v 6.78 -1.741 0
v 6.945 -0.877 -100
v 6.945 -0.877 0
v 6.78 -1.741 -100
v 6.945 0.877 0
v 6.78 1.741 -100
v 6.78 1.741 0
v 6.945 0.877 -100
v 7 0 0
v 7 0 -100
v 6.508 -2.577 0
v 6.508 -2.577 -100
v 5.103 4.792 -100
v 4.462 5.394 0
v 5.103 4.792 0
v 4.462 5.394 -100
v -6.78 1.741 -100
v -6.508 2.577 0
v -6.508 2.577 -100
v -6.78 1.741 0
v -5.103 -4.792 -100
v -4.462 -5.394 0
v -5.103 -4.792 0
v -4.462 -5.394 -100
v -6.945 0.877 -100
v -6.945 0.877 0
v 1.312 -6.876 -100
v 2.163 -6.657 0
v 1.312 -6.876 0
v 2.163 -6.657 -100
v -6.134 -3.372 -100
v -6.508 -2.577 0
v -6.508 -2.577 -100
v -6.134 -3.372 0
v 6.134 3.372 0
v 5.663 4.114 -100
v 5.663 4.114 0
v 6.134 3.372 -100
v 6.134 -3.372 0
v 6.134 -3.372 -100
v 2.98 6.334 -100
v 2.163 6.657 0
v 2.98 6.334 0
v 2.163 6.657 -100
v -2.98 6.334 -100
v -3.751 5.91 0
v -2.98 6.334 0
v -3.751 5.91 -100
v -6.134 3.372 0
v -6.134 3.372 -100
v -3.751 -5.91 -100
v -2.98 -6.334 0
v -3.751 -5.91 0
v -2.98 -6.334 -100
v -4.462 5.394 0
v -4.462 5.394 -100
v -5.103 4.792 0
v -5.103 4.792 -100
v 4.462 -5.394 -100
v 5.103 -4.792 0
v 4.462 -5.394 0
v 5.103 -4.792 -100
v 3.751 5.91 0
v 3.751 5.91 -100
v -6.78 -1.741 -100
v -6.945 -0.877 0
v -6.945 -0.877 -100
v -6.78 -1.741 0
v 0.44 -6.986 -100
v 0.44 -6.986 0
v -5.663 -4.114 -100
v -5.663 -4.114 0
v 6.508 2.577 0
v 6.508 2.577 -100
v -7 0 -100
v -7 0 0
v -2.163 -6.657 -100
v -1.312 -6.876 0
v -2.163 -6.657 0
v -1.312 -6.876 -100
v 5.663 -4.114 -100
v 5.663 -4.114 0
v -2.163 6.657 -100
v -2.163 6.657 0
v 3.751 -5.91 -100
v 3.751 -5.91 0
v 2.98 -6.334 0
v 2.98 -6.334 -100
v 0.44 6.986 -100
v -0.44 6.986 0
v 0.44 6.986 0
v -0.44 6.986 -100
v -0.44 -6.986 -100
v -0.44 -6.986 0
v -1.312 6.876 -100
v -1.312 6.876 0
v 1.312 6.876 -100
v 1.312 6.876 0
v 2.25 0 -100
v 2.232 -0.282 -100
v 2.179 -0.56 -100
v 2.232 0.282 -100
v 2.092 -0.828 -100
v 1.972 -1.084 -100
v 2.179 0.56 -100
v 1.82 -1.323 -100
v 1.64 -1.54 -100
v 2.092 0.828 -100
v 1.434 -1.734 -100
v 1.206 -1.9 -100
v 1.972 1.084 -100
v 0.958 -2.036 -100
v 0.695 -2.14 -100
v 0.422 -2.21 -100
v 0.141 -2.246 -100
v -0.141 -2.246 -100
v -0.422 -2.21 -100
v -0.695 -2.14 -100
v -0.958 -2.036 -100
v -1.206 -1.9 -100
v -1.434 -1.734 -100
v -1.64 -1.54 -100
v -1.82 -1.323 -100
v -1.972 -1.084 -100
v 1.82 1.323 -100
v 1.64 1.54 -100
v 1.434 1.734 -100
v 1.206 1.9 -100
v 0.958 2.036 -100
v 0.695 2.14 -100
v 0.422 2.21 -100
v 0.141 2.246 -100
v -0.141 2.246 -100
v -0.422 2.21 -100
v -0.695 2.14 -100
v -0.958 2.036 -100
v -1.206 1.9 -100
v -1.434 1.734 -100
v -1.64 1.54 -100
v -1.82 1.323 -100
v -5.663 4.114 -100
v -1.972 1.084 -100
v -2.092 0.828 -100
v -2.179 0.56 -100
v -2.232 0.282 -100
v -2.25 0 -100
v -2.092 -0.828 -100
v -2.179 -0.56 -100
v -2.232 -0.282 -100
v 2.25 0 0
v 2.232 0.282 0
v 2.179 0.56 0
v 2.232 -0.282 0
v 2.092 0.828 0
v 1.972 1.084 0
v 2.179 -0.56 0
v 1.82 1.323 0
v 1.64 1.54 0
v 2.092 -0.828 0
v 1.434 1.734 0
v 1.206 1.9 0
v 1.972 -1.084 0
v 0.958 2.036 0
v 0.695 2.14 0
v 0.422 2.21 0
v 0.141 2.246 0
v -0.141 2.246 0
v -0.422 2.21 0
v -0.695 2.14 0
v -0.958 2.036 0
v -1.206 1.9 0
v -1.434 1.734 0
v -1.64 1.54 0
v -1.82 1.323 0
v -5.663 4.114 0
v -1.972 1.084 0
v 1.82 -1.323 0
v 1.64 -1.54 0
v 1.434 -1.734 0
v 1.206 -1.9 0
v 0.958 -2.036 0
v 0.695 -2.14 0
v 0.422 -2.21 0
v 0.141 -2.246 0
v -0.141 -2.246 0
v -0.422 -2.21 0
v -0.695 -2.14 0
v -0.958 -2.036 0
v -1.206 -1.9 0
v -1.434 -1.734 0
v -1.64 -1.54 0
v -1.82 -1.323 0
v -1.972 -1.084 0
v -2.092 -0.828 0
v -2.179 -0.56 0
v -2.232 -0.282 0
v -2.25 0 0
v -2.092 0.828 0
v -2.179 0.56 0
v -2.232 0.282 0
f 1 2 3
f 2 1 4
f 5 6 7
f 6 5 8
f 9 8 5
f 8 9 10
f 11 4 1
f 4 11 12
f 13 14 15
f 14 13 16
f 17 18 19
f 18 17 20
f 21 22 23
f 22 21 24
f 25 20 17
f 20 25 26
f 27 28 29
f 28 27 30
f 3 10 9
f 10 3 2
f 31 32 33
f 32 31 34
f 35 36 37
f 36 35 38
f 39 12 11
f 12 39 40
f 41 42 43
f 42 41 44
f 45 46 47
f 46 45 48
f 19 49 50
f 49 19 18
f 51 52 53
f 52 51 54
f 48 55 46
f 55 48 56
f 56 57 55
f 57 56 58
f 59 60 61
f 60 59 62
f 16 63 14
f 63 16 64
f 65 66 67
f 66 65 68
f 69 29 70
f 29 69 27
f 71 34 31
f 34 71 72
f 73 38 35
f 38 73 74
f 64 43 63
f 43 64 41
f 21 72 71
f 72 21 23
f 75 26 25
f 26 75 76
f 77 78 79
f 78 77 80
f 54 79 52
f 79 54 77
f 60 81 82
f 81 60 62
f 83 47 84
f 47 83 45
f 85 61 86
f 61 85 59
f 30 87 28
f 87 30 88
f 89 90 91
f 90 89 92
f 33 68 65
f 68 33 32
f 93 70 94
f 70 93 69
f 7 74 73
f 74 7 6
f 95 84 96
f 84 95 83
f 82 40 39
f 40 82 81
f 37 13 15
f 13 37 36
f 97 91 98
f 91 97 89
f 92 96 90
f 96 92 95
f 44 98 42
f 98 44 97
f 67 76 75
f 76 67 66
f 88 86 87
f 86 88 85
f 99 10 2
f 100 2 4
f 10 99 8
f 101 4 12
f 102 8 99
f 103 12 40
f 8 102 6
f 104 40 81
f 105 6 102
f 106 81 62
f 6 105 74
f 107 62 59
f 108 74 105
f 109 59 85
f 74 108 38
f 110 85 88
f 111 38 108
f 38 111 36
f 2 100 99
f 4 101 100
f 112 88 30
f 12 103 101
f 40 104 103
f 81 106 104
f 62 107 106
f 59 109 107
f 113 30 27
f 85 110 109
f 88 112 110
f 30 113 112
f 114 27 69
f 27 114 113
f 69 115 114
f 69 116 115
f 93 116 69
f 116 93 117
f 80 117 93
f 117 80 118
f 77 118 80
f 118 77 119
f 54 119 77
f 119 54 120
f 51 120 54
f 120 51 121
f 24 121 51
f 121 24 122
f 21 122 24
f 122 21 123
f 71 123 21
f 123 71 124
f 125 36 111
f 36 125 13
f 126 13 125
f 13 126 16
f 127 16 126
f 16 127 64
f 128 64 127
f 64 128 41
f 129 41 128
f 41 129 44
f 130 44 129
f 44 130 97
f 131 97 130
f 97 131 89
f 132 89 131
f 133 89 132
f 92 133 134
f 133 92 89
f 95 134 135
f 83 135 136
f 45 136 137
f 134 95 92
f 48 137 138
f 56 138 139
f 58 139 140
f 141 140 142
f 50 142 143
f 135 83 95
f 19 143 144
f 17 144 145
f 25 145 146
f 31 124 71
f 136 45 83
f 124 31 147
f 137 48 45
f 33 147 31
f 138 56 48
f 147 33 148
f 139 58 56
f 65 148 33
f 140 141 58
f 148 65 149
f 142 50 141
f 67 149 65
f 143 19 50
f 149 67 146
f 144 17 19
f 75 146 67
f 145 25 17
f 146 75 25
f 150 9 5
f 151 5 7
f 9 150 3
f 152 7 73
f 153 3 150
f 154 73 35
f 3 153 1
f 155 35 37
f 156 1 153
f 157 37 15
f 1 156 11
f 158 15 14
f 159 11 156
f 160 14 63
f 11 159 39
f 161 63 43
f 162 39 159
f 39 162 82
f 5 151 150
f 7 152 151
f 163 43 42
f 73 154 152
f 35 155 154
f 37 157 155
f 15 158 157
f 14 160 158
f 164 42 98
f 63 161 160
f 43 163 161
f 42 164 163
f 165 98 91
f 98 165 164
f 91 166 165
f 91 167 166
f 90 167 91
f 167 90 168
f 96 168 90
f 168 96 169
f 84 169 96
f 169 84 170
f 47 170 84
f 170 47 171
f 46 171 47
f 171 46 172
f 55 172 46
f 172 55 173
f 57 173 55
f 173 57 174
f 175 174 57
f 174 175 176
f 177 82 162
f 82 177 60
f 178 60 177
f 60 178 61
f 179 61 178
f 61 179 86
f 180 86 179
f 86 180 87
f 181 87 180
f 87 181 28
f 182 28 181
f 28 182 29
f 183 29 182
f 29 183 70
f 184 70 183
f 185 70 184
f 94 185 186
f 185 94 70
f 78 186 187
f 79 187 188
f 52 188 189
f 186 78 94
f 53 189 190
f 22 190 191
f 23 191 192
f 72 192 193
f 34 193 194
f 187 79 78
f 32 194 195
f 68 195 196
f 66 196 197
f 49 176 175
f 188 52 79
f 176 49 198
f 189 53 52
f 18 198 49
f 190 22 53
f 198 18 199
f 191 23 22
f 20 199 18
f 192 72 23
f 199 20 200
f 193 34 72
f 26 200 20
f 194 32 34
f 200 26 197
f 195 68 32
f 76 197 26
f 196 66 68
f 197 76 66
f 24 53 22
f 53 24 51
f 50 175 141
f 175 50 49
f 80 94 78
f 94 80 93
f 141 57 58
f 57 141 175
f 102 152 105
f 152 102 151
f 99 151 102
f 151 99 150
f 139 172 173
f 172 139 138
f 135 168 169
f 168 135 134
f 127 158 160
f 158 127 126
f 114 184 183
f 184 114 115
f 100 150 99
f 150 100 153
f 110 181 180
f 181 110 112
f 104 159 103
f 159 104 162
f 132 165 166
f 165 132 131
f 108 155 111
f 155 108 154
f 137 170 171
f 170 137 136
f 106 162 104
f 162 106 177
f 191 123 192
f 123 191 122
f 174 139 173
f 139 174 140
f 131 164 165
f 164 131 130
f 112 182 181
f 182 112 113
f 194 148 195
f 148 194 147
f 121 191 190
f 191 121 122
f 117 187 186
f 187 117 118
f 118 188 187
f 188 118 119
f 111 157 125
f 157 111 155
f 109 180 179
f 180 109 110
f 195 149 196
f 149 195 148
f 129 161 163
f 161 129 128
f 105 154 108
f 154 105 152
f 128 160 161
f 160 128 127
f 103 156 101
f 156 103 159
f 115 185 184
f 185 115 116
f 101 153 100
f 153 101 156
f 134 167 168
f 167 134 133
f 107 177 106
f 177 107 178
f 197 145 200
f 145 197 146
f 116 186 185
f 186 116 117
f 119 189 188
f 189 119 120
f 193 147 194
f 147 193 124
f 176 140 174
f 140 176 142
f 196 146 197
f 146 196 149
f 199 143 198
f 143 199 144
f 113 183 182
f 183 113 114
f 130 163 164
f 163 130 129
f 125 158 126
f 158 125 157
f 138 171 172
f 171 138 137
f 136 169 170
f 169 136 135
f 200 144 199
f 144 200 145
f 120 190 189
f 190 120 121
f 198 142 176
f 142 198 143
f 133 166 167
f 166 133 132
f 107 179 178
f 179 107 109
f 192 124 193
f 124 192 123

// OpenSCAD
$fn = 50;


difference() {
	union() {
		translate(v = [0, 0, -100.0000000000]) {
			cylinder(h = 100, r = 7.0000000000);
		}
		cylinder(h = 0, r = 16.0000000000);
	}
	union() {
		#translate(v = [0, 0, -100]) {
			cylinder(h = 100, r = 2.2500000000);
		}
	}
}
